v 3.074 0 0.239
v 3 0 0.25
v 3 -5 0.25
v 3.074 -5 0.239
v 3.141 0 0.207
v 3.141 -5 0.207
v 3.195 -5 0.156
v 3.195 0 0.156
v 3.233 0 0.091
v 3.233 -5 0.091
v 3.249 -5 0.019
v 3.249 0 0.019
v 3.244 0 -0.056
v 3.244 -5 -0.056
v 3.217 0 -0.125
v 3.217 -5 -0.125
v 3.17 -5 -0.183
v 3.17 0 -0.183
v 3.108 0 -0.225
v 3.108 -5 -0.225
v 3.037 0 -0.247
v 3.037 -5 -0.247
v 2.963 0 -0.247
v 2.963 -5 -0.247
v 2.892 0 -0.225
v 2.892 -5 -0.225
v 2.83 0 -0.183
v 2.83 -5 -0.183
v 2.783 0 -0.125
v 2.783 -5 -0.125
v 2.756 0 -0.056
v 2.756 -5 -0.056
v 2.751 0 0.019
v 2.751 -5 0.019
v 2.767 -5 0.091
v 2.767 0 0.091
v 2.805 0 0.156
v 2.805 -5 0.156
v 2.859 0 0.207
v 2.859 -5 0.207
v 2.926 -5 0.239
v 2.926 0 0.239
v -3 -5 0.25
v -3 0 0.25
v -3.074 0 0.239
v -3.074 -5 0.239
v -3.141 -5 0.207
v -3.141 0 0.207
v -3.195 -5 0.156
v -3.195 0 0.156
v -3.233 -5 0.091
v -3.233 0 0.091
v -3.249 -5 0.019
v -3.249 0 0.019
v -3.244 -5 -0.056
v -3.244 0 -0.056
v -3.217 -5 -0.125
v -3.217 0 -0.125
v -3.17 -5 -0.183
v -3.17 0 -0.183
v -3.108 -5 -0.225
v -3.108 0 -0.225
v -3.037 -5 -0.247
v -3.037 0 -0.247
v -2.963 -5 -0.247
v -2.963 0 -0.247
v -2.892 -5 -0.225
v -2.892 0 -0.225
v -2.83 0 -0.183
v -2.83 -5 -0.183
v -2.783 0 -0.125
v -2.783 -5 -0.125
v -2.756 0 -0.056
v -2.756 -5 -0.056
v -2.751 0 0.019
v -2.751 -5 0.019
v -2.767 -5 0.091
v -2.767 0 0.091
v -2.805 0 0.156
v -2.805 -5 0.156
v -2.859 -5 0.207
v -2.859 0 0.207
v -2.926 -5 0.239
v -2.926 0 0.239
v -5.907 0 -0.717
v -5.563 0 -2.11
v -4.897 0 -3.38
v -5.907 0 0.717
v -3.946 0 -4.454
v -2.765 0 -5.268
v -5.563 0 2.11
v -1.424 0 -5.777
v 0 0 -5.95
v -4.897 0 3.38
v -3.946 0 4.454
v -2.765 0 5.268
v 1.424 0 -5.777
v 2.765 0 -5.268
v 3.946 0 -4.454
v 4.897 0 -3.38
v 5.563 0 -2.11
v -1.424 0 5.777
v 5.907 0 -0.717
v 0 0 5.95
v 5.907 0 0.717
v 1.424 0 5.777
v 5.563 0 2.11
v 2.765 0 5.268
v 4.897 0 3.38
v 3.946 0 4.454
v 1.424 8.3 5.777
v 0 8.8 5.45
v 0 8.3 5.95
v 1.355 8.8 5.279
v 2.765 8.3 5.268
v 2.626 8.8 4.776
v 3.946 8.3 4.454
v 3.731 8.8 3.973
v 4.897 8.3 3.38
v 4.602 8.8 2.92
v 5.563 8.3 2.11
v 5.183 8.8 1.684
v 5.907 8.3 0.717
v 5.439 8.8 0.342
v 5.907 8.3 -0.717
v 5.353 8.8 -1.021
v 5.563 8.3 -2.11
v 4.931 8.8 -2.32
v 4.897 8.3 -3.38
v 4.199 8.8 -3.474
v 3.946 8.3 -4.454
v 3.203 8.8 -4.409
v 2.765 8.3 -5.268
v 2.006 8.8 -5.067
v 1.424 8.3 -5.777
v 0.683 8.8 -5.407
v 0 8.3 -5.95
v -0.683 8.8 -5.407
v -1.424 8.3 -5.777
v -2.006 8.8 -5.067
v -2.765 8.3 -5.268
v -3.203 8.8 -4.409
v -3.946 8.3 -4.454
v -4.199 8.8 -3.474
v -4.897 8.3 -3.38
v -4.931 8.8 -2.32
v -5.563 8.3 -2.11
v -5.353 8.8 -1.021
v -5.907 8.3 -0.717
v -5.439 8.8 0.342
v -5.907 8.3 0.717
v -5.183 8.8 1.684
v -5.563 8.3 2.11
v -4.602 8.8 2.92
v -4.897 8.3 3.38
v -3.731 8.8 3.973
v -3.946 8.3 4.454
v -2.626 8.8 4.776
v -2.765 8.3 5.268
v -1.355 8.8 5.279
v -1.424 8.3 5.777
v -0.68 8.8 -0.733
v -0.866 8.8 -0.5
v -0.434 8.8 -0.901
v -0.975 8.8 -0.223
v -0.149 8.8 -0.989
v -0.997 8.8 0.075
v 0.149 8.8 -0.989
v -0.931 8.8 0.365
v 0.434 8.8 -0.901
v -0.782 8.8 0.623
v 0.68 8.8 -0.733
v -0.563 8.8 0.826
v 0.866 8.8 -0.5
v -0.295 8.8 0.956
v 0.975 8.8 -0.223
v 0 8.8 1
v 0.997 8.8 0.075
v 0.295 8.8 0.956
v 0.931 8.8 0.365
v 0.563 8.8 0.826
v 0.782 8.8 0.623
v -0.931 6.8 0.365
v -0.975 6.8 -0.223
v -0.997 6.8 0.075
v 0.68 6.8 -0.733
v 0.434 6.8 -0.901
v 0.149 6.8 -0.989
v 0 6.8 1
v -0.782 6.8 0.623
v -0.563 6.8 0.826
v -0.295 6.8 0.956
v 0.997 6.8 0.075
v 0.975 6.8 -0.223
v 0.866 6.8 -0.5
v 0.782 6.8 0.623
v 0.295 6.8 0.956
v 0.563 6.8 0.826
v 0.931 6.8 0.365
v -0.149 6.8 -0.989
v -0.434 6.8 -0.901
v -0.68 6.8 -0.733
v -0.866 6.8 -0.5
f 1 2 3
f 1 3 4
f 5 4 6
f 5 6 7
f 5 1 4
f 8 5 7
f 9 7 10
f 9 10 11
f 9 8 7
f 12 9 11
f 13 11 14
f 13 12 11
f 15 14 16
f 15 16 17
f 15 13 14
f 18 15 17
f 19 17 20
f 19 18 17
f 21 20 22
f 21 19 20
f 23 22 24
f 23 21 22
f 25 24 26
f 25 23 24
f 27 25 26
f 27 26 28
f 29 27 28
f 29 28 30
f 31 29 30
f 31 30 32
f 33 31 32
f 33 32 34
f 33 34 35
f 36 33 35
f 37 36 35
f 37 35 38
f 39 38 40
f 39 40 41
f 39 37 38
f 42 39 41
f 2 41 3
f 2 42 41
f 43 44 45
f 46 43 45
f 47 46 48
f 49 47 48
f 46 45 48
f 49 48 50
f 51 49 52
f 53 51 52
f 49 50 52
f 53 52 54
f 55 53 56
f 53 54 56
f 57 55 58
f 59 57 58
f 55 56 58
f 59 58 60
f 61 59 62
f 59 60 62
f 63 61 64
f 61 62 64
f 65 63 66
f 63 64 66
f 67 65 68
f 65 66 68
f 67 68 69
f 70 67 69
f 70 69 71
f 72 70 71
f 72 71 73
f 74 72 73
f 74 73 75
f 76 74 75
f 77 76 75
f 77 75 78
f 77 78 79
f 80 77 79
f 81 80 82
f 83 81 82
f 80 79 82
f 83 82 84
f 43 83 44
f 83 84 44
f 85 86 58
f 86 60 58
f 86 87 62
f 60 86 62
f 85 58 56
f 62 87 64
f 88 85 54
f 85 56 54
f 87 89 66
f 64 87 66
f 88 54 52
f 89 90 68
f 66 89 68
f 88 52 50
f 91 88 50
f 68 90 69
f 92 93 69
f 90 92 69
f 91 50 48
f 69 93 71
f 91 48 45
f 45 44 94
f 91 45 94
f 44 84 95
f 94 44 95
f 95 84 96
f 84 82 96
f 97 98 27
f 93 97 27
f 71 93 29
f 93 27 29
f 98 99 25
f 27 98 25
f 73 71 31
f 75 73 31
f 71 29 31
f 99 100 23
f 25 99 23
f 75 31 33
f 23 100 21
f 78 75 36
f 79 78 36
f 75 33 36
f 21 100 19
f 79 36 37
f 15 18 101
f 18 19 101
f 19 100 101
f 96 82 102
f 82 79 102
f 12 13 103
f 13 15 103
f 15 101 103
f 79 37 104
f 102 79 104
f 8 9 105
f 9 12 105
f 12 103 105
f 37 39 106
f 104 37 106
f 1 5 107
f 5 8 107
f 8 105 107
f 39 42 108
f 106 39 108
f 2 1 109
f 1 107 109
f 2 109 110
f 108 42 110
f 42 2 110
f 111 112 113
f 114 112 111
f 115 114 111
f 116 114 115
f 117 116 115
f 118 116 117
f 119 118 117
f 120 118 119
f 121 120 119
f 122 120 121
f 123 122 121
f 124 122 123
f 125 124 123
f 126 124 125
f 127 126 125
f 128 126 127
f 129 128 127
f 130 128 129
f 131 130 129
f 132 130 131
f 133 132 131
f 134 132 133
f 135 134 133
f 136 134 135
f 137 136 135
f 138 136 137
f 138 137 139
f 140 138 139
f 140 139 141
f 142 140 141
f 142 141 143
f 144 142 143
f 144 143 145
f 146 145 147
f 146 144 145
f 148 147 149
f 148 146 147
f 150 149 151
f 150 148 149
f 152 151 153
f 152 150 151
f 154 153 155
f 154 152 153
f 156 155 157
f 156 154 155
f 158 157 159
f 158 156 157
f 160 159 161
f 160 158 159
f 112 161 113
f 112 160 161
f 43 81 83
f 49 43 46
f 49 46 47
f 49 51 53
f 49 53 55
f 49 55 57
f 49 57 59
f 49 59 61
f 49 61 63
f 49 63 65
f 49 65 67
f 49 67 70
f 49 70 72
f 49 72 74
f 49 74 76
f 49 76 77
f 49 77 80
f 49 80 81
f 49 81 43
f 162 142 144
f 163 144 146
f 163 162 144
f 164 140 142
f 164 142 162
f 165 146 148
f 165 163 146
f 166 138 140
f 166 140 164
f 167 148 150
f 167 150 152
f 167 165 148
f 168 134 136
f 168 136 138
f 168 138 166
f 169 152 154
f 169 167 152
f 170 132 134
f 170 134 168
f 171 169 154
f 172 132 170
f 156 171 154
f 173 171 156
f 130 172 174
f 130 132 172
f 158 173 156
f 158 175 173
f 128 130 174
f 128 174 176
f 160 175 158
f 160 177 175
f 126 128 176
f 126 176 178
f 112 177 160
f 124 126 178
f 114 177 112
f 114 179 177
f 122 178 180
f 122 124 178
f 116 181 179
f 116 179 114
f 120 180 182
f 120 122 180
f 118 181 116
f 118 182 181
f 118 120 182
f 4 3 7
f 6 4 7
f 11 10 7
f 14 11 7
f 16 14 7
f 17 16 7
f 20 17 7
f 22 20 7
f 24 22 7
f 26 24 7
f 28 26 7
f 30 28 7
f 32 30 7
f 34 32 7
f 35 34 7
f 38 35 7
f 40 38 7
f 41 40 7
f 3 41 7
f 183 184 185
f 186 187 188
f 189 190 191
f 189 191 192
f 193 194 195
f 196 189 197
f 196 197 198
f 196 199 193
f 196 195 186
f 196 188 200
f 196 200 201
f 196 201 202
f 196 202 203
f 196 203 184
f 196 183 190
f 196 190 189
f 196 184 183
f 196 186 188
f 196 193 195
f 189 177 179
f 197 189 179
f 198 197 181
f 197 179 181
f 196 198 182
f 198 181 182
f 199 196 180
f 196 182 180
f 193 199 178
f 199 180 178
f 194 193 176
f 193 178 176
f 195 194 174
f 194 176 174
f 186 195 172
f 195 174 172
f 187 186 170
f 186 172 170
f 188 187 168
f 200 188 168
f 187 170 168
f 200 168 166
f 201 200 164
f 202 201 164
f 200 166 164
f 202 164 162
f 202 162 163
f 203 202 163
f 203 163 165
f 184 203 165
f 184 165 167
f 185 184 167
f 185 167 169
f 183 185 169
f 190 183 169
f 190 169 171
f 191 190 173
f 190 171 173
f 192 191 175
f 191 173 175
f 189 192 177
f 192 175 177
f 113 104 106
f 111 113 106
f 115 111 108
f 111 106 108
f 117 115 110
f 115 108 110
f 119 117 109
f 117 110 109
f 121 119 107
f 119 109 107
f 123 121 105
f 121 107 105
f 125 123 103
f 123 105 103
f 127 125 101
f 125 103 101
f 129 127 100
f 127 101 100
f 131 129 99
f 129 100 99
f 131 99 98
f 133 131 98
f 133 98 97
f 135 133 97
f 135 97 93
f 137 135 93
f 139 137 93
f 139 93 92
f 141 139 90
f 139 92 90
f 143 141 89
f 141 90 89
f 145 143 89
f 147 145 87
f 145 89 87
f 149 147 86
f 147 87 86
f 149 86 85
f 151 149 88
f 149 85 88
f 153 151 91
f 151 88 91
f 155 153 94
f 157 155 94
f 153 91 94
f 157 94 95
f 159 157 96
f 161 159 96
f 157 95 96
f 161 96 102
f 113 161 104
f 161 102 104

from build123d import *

# Parameters (mm, degrees)
SKETCH1_R           = 5.95
BOSS_EXTRUDE1_DEPTH = 8.8
SKETCH2_R           = 1
CUT_EXTRUDE1_DEPTH  = 2
CHAMFER1_SIZE       = 0.5
SKETCH3_R           = 0.25
BOSS_EXTRUDE2_DEPTH = 5


with BuildPart() as part:
    # Sketch1 → Boss-Extrude1 (new body)
    with BuildSketch(Plane(origin=(0, 0, 0), x_dir=(1, 0, 0), z_dir=(0, 1, 0))):
        with Locations(Location((0, 0, 0), (0, 0, 270))):
            Circle(SKETCH1_R)
    extrude(amount=BOSS_EXTRUDE1_DEPTH)

    # Sketch2 → Cut-Extrude1 (cut)
    with BuildSketch(Plane(origin=(0, 8.8, 0), x_dir=(1, 0, 0), z_dir=(0, 1, 0))):
        with Locations(Location((0, 0, 0), (0, 0, 270))):
            Circle(SKETCH2_R)
    extrude(amount=-CUT_EXTRUDE1_DEPTH, mode=Mode.SUBTRACT)

    # Chamfer1
    chamfer1_edges = [part.edges().sort_by_distance(p)[0] for p in [
        (0, 8.8, -5.95),
    ]]
    chamfer(chamfer1_edges, length=CHAMFER1_SIZE)

    # Sketch3 → Boss-Extrude2 (add)
    with BuildSketch(Plane.XZ):
        with Locations(Location((-3, 0, 0), (0, 0, 90))):
            Circle(SKETCH3_R)
    boss_extrude2 = extrude(amount=BOSS_EXTRUDE2_DEPTH)

    # Mirror1: Boss-Extrude2 across plane
    add(boss_extrude2.mirror(Plane(origin=(0, 0, 0), x_dir=(0, 0, 1), z_dir=(1, 0, 0))))


solid = part.part
